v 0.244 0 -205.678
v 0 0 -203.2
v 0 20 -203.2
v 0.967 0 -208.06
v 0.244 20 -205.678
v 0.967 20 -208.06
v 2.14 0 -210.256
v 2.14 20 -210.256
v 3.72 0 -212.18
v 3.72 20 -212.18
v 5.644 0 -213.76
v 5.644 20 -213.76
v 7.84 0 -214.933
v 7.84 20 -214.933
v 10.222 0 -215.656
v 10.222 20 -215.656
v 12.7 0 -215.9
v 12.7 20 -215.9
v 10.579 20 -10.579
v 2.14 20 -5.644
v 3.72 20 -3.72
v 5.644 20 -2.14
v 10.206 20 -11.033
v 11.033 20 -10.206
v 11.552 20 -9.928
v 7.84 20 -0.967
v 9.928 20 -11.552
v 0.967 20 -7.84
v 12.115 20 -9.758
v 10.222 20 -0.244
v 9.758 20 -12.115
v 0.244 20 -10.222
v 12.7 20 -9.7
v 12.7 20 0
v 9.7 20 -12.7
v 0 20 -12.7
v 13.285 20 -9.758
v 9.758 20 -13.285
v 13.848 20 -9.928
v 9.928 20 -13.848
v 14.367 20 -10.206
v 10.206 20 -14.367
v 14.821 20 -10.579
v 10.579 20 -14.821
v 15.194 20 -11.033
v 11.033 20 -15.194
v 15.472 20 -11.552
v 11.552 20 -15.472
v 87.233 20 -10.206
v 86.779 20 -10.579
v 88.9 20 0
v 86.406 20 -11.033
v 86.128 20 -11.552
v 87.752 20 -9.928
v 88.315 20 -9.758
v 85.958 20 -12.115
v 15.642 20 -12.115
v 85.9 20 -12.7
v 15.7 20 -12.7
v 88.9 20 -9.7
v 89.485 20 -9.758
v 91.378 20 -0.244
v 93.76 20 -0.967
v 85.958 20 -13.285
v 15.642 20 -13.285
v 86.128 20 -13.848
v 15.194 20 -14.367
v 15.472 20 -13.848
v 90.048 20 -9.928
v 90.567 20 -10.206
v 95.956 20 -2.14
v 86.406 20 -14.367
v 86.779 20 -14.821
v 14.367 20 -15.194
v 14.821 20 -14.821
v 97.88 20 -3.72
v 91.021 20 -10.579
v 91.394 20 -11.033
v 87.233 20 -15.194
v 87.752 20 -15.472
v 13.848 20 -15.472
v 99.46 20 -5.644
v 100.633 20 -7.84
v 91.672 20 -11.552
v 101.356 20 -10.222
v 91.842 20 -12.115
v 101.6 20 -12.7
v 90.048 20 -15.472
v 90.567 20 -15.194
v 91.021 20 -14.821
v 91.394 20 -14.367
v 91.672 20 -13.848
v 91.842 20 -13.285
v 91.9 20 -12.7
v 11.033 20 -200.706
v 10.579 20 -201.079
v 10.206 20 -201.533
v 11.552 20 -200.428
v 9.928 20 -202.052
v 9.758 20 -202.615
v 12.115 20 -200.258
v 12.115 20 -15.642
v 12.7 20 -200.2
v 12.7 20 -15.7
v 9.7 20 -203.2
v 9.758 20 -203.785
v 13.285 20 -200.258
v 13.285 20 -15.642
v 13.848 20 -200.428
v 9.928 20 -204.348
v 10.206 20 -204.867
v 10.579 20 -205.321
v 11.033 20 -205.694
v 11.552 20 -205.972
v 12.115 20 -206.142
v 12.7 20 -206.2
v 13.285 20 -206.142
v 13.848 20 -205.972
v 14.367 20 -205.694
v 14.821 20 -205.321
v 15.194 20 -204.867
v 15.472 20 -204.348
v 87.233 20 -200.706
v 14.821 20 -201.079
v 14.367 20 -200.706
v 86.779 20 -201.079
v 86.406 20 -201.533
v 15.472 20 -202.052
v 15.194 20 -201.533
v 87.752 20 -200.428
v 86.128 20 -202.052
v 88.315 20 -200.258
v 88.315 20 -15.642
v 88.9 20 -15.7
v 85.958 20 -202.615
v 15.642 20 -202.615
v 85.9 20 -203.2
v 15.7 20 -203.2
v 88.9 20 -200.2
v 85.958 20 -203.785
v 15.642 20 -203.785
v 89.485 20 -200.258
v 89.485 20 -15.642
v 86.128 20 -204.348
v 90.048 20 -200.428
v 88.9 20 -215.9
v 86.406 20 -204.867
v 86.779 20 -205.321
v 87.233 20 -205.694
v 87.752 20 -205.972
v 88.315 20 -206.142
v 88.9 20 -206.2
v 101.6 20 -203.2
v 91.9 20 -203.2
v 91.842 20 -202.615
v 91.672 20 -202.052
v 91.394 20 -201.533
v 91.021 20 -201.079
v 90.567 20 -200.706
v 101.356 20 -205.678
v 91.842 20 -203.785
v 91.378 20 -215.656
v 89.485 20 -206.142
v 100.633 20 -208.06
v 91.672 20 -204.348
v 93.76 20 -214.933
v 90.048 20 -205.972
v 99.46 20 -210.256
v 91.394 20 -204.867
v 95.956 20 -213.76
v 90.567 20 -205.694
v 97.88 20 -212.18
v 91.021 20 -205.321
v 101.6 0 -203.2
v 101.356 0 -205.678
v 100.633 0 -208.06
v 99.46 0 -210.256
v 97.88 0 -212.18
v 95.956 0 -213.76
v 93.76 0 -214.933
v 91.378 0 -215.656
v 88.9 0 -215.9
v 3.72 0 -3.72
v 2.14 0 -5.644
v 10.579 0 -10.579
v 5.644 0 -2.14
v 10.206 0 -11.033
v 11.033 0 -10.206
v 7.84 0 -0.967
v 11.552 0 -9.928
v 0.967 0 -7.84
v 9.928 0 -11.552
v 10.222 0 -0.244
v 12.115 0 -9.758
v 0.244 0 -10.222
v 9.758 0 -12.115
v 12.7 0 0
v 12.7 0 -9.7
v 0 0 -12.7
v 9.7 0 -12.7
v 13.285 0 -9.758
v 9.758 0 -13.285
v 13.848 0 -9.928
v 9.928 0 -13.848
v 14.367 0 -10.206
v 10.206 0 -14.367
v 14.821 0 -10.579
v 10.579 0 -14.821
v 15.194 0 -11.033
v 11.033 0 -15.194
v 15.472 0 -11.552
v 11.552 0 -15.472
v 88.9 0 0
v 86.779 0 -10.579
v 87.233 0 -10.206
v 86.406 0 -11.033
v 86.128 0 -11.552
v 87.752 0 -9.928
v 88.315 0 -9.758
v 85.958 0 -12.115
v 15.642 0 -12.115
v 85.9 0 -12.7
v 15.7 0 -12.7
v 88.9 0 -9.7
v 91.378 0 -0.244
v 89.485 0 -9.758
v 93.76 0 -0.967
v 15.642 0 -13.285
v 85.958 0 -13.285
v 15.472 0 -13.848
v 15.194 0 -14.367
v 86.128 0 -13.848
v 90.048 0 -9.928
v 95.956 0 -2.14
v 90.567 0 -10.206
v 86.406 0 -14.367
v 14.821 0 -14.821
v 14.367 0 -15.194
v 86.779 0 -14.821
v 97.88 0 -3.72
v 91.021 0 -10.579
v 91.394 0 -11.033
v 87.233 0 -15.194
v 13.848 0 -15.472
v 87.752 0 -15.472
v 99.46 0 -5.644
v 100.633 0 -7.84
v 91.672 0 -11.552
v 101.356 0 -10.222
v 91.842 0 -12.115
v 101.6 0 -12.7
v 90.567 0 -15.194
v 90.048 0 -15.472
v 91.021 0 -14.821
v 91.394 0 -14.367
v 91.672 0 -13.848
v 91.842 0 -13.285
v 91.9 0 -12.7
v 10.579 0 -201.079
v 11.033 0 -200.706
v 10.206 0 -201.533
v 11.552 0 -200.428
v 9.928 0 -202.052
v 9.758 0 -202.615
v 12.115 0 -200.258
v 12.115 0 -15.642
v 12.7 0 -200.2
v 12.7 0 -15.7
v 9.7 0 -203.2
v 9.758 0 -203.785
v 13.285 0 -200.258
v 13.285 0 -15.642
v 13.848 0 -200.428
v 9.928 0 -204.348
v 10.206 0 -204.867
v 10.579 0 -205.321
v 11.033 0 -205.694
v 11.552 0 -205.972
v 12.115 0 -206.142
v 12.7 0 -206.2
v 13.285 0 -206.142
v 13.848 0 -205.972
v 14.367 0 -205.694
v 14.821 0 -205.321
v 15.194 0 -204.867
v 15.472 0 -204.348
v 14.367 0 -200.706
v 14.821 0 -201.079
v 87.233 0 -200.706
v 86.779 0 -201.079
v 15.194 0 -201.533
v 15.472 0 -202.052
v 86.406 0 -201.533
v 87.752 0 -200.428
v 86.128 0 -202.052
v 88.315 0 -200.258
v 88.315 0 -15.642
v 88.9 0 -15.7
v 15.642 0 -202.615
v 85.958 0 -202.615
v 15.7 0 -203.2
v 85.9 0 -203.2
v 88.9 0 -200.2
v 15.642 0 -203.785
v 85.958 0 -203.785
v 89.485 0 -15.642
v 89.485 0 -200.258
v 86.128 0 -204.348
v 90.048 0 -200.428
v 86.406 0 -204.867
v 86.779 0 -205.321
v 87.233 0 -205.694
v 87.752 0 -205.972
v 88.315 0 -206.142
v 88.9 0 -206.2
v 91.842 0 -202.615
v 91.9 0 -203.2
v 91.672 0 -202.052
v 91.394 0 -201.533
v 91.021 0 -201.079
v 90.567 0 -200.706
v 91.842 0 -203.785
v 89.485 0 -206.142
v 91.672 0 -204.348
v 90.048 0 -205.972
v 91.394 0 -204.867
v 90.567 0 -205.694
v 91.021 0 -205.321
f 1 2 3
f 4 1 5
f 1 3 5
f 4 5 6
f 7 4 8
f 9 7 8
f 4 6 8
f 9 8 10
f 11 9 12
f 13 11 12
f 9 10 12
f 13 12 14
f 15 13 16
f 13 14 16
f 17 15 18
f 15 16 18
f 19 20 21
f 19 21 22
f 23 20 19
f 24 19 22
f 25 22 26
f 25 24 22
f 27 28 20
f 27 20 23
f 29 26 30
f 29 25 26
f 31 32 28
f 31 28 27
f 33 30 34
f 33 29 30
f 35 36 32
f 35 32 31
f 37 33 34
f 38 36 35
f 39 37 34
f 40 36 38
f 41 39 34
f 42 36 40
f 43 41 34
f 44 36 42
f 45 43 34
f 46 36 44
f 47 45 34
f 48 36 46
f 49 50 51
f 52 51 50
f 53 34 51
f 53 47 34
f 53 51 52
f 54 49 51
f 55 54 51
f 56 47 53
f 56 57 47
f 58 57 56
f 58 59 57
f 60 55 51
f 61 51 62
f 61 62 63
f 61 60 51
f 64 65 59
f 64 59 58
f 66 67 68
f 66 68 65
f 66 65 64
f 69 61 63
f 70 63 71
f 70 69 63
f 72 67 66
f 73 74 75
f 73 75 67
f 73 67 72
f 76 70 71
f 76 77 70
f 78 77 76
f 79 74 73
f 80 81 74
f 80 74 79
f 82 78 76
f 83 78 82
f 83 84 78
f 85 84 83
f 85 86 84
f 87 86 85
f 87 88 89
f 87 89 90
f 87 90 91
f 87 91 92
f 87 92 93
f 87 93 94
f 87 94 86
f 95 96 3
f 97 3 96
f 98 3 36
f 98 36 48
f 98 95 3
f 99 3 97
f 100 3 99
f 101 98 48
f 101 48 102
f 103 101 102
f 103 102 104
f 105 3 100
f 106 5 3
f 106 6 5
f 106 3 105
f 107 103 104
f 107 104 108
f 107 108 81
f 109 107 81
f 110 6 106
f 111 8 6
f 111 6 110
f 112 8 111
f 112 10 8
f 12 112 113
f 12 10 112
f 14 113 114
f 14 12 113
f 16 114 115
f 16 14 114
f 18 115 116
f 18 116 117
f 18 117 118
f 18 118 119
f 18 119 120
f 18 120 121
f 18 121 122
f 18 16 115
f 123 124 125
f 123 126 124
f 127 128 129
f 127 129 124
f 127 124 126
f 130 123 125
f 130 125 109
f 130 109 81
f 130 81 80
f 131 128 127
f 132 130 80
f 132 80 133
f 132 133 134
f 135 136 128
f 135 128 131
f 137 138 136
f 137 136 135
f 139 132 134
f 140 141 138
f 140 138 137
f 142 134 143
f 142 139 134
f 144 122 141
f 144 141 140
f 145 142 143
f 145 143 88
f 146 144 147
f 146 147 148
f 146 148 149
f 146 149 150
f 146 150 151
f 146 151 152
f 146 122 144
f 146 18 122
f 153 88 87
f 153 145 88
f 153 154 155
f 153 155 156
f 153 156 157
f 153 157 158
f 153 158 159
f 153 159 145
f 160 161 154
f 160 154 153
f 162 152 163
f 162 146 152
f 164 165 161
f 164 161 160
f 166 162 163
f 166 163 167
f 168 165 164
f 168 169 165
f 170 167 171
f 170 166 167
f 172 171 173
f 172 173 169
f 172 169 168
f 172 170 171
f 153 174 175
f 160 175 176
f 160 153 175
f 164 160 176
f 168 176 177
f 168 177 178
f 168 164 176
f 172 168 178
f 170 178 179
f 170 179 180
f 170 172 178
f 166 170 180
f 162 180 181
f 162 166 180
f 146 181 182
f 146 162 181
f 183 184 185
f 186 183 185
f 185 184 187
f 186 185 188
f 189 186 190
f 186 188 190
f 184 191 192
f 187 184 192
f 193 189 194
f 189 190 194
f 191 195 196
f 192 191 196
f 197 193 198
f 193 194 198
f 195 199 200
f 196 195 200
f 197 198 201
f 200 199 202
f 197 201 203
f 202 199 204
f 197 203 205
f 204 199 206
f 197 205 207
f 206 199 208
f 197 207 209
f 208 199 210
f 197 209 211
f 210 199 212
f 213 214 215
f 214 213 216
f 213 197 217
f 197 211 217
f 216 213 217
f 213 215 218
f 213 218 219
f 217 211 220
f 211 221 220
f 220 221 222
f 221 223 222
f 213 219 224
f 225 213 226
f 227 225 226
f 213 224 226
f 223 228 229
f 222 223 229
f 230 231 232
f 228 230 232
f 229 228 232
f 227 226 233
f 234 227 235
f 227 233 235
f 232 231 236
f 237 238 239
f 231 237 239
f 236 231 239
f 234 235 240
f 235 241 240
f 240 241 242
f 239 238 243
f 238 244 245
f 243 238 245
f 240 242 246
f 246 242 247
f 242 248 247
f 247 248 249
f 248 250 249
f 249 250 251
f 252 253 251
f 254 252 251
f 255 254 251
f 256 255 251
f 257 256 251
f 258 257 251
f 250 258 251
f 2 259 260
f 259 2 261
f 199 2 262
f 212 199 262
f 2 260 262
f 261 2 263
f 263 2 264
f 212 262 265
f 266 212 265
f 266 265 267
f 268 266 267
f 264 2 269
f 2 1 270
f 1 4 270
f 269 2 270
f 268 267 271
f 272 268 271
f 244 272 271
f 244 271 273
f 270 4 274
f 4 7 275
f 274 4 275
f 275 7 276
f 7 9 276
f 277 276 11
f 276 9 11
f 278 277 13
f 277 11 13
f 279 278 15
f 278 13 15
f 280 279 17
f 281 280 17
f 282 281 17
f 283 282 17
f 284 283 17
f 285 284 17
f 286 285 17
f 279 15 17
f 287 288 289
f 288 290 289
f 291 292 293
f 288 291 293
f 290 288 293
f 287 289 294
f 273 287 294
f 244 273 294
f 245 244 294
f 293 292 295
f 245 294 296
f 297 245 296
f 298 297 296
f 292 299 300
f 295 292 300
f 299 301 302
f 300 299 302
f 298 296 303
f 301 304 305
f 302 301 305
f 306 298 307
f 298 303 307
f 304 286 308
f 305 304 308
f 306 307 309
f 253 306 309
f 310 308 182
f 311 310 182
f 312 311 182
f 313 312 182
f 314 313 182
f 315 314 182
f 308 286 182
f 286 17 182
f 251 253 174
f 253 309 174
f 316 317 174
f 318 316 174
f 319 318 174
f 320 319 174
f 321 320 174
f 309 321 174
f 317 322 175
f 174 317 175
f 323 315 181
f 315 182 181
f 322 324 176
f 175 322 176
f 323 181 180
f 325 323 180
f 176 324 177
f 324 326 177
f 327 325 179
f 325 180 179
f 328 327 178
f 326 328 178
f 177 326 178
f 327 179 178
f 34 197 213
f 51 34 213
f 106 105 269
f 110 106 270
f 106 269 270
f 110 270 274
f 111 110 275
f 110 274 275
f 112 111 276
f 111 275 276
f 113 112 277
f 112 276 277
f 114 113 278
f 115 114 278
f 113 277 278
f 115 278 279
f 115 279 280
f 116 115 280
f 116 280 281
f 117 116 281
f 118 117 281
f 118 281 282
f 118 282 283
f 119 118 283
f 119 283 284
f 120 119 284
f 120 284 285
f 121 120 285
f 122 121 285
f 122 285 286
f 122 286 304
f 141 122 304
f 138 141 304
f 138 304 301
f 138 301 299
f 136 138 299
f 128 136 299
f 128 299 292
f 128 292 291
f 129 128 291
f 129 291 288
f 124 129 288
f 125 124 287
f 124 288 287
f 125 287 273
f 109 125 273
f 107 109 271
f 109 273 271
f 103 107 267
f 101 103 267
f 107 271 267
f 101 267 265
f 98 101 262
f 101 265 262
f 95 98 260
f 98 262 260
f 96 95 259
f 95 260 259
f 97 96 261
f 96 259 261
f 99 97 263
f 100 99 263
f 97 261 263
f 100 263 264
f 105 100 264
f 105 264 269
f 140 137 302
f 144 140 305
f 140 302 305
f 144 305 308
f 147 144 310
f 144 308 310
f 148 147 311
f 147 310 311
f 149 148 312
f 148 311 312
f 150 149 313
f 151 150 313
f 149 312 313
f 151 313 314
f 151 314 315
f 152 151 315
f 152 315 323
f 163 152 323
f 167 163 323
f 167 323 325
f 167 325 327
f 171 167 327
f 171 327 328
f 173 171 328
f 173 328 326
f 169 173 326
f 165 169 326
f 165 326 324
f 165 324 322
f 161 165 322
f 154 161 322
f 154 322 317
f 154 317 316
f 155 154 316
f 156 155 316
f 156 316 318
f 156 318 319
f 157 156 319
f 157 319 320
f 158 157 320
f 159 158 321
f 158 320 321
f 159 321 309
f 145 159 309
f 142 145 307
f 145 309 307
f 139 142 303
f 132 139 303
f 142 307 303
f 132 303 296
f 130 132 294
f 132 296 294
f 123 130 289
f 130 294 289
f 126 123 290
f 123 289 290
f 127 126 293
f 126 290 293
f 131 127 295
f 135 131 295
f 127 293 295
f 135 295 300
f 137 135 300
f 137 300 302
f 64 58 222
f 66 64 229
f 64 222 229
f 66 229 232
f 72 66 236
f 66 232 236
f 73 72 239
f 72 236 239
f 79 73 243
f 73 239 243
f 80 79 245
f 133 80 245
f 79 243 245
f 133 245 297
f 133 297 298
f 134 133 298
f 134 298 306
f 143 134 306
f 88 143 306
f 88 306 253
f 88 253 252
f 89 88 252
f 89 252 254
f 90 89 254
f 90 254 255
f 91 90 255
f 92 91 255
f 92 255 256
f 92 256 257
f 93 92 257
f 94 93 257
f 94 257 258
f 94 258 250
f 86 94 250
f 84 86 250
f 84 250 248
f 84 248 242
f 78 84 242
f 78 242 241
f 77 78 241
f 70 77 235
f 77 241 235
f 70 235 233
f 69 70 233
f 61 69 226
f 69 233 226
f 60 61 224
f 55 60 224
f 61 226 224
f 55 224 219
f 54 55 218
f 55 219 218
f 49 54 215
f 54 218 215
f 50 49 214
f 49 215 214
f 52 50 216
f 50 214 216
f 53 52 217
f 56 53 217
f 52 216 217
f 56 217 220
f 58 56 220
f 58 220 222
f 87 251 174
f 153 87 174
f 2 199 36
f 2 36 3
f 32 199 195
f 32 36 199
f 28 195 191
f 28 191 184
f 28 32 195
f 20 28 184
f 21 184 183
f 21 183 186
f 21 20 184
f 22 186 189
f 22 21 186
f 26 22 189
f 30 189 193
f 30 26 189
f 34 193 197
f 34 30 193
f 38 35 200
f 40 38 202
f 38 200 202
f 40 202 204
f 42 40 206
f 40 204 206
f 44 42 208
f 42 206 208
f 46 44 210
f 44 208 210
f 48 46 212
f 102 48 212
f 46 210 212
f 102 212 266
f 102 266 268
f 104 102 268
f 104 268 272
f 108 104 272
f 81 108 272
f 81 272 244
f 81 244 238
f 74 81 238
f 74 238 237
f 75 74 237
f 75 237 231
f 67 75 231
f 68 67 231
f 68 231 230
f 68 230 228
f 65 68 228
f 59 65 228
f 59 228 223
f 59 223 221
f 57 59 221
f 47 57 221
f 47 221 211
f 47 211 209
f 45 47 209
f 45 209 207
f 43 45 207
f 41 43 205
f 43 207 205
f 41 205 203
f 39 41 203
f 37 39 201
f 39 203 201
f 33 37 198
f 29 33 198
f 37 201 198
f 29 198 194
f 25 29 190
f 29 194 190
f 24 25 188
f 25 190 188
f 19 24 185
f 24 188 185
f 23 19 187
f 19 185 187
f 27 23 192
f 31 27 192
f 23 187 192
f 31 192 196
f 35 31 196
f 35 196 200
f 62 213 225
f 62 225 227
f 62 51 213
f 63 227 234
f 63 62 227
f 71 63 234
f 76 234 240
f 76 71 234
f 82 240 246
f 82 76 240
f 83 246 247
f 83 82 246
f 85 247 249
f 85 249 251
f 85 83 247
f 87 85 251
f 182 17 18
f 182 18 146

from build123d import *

# Parameters (mm, degrees)
SKETCH1_W           = 101.6
SKETCH1_H           = 215.9
BOSS_EXTRUDE2_DEPTH = 20
FILLET1_R           = 12.7
SKETCH5_R           = 3
CUT_EXTRUDE1_DEPTH  = 21


with BuildPart() as part:
    # Sketch1 → Boss-Extrude2 (new body)
    with BuildSketch(Plane(origin=(0, 0, 0), x_dir=(1, 0, 0), z_dir=(0, 1, 0))):
        with Locations((50.8, 107.95)):
            Rectangle(SKETCH1_W, SKETCH1_H)
    extrude(amount=BOSS_EXTRUDE2_DEPTH)

    # Fillet1
    fillet1_edges = [part.edges().sort_by_distance(p)[0] for p in [
        (0, 10, -215.9),
        (101.6, 10, -215.9),
        (101.6, 10, 0),
        (0, 10, 0),
    ]]
    fillet(fillet1_edges, radius=FILLET1_R)

    # Sketch5 → Cut-Extrude1 (cut, through all)
    with BuildSketch(Plane(origin=(0, 0, 0), x_dir=(-1, 0, 0), z_dir=(0, -1, 0))):
        with Locations((-88.9, 203.2)):
            Circle(SKETCH5_R)
        with Locations((-12.7, 203.2)):
            Circle(SKETCH5_R)
        with Locations((-88.9, 12.7)):
            Circle(SKETCH5_R)
        with Locations((-12.7, 12.7)):
            Circle(SKETCH5_R)
    extrude(amount=-CUT_EXTRUDE1_DEPTH, mode=Mode.SUBTRACT)


solid = part.part
